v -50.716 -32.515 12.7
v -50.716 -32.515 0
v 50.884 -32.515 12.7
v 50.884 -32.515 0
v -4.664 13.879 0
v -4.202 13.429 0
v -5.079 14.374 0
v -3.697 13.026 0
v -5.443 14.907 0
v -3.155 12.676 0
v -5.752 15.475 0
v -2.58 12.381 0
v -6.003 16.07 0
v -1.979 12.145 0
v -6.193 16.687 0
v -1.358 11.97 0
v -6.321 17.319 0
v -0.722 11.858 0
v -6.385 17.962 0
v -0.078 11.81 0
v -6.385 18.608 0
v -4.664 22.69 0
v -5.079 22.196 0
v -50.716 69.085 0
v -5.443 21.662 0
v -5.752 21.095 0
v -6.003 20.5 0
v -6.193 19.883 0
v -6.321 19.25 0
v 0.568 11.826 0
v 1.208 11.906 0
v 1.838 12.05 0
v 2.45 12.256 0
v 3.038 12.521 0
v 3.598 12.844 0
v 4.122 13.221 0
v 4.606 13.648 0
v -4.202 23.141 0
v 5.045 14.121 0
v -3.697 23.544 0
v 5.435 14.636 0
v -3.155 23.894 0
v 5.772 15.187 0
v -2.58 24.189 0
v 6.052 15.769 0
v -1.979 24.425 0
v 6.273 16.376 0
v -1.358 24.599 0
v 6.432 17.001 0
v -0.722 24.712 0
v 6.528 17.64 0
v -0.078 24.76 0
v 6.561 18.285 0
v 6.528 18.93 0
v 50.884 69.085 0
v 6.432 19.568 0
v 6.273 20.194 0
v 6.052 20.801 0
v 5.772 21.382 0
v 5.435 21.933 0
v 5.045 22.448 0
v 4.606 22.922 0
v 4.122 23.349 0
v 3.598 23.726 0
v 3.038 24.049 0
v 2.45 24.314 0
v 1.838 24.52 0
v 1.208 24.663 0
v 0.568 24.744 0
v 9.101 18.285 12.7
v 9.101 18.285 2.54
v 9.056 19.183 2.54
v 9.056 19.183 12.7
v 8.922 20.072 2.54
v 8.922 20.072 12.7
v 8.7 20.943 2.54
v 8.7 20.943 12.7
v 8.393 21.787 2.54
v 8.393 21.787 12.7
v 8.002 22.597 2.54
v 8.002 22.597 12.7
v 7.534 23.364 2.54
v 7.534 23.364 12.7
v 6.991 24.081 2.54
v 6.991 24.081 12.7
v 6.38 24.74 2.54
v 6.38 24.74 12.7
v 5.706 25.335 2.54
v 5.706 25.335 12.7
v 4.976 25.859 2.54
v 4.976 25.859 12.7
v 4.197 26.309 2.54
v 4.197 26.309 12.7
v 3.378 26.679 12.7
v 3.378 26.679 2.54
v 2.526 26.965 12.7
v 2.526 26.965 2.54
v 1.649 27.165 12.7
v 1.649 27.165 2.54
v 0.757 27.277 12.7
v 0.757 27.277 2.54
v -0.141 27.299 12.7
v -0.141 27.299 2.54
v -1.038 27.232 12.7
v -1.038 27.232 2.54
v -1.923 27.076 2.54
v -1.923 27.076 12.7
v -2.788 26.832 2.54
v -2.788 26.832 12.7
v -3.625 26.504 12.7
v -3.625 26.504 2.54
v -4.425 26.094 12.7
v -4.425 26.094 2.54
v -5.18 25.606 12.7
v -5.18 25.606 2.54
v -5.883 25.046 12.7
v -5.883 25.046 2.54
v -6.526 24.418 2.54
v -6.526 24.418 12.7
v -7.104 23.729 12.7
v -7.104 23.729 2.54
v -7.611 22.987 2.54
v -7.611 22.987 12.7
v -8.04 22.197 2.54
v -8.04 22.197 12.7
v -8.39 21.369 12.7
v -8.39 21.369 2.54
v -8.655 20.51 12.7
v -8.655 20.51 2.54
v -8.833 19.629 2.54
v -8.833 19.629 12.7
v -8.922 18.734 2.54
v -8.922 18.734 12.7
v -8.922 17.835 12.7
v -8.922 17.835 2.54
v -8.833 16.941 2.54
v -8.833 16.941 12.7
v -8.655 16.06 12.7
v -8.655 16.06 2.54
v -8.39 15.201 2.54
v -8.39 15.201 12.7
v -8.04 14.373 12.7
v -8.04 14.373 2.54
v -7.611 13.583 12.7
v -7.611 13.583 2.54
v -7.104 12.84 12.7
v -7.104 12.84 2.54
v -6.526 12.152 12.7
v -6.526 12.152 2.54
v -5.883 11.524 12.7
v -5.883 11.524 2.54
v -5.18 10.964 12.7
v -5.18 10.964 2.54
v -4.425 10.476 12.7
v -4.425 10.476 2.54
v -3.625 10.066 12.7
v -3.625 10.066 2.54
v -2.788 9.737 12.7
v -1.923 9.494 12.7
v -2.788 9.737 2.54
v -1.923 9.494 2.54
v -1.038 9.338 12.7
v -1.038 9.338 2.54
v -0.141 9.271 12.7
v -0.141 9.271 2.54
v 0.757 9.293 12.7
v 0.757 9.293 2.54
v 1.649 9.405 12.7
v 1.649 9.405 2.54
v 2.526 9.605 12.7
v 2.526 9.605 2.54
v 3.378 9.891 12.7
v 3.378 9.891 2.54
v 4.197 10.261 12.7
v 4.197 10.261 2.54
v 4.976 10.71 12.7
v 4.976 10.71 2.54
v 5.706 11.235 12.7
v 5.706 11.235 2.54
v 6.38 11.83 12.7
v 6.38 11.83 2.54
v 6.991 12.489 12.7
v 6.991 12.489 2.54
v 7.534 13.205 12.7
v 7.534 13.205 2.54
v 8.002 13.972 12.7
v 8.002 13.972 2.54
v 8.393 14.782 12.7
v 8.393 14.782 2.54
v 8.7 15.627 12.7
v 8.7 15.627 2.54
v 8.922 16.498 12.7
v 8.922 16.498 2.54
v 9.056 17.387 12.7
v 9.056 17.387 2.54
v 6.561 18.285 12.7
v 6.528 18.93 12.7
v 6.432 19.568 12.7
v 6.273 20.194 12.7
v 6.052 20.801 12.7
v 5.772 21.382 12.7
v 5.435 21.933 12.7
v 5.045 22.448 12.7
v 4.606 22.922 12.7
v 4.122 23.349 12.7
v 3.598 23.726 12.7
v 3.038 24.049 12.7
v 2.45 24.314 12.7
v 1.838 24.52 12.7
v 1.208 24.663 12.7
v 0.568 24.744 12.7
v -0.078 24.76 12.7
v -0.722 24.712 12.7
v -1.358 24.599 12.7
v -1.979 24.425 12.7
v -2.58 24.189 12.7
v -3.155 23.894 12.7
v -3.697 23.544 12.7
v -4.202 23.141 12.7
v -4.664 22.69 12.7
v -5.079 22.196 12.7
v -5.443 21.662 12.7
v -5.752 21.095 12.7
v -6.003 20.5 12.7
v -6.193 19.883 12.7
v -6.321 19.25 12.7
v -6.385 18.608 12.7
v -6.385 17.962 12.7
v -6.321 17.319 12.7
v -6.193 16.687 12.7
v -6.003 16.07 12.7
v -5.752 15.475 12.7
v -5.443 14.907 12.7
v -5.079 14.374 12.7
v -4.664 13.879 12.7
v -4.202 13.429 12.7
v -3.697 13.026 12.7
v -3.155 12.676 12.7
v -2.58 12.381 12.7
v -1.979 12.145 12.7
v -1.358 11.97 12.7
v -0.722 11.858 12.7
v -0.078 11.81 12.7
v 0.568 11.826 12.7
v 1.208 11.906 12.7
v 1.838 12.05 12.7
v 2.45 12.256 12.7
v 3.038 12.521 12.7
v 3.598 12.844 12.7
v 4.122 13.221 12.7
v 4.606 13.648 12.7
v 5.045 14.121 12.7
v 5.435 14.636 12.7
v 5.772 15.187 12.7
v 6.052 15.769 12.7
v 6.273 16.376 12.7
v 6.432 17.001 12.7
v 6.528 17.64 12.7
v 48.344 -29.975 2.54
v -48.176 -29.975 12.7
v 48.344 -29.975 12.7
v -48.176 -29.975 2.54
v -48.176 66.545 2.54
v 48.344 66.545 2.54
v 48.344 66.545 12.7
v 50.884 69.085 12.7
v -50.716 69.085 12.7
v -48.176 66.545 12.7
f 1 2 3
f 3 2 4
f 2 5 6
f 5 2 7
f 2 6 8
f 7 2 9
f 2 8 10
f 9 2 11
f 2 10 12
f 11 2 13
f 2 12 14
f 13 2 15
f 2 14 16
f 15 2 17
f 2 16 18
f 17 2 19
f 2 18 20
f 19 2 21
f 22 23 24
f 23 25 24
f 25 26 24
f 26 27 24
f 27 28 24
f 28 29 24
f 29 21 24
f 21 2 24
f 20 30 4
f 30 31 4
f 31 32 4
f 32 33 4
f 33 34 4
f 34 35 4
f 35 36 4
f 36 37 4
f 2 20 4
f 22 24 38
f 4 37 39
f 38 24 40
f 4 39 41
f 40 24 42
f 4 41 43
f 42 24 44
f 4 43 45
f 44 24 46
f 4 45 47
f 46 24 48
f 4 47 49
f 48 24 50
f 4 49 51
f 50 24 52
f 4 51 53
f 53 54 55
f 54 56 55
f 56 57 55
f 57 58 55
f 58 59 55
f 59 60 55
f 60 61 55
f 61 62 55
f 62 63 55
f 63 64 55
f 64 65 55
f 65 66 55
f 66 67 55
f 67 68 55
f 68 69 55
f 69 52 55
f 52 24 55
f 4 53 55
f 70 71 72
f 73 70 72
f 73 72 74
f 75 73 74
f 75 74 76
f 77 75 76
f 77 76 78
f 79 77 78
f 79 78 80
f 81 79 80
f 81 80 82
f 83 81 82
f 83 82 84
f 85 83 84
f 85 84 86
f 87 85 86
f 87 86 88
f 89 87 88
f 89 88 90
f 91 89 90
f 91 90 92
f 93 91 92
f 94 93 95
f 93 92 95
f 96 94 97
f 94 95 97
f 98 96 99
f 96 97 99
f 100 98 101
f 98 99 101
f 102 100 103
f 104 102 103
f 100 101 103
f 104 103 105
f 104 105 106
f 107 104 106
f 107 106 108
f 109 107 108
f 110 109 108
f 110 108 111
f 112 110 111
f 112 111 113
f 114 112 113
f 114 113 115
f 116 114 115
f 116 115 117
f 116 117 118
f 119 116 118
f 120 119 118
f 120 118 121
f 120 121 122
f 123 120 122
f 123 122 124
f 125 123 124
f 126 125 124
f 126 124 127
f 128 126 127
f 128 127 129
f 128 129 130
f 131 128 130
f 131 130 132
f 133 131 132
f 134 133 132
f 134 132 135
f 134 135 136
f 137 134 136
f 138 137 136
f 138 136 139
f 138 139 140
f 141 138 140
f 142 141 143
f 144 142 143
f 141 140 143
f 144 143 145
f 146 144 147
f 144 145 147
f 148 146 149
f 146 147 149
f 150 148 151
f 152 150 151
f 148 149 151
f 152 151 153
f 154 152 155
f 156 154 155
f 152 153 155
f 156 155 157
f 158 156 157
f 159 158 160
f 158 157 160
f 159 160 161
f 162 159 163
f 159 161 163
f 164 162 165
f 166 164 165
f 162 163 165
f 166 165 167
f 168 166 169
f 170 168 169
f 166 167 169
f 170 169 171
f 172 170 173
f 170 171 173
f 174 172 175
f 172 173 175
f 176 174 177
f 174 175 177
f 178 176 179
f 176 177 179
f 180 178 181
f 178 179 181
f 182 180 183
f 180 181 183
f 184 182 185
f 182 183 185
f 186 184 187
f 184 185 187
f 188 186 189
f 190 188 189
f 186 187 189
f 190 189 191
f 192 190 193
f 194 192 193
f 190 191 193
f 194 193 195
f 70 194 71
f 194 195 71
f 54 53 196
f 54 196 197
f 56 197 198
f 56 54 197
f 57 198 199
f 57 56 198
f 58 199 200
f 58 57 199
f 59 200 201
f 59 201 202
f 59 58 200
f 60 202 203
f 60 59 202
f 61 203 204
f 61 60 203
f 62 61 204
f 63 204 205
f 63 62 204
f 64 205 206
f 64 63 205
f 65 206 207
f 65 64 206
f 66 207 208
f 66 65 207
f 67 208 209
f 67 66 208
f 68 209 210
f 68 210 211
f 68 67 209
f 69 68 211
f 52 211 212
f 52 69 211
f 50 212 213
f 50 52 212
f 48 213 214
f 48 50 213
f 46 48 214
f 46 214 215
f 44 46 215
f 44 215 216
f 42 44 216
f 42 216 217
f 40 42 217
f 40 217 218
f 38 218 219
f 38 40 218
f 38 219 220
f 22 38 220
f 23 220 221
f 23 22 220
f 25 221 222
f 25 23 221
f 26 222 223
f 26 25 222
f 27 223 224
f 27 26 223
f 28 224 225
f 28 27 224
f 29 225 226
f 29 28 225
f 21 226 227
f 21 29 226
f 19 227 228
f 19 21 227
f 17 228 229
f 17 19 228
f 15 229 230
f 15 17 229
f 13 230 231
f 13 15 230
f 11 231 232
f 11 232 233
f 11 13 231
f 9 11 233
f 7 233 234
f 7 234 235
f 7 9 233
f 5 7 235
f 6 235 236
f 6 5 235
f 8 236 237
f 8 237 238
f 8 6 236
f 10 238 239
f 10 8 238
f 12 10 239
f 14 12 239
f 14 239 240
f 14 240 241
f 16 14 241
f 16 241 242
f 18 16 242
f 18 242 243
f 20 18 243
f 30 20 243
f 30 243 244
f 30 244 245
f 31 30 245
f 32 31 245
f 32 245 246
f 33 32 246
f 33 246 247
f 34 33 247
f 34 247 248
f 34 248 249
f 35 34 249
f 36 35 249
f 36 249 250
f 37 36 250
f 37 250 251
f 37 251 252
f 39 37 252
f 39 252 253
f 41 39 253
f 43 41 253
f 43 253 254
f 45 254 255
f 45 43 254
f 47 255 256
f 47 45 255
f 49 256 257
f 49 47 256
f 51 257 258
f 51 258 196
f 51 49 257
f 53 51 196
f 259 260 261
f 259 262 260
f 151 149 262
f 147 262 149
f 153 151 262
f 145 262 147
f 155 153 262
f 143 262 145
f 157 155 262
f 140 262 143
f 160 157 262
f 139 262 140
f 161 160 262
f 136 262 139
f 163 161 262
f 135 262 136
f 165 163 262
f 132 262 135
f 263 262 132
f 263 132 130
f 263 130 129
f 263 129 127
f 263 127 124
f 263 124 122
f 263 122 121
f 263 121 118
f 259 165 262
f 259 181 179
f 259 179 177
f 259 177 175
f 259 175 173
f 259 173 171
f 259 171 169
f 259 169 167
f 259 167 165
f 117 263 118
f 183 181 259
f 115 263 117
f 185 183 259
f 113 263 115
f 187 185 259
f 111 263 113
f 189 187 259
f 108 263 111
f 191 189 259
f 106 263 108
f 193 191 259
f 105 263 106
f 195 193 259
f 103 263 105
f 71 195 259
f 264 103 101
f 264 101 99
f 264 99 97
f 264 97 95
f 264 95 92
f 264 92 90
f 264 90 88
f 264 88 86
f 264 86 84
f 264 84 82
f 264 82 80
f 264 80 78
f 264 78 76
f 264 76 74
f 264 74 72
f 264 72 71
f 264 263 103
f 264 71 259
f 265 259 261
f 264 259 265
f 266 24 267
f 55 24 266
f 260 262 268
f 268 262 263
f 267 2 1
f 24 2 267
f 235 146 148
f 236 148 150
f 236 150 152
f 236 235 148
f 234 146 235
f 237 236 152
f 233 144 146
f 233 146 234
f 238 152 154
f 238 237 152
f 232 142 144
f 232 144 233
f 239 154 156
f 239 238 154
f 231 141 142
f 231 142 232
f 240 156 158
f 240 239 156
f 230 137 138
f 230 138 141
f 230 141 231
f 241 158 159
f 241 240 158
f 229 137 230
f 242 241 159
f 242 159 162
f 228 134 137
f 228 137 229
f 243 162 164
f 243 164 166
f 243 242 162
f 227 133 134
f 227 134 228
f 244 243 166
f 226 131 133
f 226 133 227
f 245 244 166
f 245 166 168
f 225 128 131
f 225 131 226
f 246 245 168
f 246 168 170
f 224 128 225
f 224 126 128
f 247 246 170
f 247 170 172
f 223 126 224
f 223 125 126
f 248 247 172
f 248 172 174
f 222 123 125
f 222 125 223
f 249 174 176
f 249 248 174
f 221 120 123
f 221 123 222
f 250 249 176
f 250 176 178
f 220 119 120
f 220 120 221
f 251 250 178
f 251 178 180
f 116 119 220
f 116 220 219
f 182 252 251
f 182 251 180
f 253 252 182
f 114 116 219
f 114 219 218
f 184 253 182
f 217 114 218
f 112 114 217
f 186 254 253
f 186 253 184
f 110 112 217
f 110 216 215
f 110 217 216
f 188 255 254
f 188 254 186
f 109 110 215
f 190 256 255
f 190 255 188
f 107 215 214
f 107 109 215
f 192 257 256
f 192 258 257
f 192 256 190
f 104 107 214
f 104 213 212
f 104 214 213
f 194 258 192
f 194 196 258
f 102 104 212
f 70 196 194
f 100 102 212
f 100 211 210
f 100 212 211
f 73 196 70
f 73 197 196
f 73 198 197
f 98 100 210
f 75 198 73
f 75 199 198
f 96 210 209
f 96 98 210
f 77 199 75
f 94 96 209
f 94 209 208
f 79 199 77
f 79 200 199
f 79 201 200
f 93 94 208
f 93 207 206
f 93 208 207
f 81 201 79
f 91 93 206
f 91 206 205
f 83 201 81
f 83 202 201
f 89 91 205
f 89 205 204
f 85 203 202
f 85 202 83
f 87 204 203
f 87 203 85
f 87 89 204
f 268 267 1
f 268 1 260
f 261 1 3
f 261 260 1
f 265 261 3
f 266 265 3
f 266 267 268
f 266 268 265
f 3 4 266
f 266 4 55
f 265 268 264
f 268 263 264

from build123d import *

# Parameters (mm, degrees)
F0_W     = 101.6
F0_H     = 101.6
F0_R     = 6.477
F1_DEPTH = 12.7
F2_T     = -2.54


with BuildPart() as f1:
    # F0 (on Top) → F1 (new body)
    with BuildSketch(Plane.XY):
        with Locations((0.083563, 18.284834)):
            Rectangle(F0_W, F0_H)
        with Locations((0.083563, 18.284834)):
            Circle(F0_R, mode=Mode.SUBTRACT)
    extrude(amount=F1_DEPTH)

    # F2
    f2_openings = [f1.faces().sort_by_distance(p)[0] for p in [
        (49.446723, 18.284834, 12.7),
    ]]
    offset(amount=F2_T, openings=f2_openings)


solid = f1.part
